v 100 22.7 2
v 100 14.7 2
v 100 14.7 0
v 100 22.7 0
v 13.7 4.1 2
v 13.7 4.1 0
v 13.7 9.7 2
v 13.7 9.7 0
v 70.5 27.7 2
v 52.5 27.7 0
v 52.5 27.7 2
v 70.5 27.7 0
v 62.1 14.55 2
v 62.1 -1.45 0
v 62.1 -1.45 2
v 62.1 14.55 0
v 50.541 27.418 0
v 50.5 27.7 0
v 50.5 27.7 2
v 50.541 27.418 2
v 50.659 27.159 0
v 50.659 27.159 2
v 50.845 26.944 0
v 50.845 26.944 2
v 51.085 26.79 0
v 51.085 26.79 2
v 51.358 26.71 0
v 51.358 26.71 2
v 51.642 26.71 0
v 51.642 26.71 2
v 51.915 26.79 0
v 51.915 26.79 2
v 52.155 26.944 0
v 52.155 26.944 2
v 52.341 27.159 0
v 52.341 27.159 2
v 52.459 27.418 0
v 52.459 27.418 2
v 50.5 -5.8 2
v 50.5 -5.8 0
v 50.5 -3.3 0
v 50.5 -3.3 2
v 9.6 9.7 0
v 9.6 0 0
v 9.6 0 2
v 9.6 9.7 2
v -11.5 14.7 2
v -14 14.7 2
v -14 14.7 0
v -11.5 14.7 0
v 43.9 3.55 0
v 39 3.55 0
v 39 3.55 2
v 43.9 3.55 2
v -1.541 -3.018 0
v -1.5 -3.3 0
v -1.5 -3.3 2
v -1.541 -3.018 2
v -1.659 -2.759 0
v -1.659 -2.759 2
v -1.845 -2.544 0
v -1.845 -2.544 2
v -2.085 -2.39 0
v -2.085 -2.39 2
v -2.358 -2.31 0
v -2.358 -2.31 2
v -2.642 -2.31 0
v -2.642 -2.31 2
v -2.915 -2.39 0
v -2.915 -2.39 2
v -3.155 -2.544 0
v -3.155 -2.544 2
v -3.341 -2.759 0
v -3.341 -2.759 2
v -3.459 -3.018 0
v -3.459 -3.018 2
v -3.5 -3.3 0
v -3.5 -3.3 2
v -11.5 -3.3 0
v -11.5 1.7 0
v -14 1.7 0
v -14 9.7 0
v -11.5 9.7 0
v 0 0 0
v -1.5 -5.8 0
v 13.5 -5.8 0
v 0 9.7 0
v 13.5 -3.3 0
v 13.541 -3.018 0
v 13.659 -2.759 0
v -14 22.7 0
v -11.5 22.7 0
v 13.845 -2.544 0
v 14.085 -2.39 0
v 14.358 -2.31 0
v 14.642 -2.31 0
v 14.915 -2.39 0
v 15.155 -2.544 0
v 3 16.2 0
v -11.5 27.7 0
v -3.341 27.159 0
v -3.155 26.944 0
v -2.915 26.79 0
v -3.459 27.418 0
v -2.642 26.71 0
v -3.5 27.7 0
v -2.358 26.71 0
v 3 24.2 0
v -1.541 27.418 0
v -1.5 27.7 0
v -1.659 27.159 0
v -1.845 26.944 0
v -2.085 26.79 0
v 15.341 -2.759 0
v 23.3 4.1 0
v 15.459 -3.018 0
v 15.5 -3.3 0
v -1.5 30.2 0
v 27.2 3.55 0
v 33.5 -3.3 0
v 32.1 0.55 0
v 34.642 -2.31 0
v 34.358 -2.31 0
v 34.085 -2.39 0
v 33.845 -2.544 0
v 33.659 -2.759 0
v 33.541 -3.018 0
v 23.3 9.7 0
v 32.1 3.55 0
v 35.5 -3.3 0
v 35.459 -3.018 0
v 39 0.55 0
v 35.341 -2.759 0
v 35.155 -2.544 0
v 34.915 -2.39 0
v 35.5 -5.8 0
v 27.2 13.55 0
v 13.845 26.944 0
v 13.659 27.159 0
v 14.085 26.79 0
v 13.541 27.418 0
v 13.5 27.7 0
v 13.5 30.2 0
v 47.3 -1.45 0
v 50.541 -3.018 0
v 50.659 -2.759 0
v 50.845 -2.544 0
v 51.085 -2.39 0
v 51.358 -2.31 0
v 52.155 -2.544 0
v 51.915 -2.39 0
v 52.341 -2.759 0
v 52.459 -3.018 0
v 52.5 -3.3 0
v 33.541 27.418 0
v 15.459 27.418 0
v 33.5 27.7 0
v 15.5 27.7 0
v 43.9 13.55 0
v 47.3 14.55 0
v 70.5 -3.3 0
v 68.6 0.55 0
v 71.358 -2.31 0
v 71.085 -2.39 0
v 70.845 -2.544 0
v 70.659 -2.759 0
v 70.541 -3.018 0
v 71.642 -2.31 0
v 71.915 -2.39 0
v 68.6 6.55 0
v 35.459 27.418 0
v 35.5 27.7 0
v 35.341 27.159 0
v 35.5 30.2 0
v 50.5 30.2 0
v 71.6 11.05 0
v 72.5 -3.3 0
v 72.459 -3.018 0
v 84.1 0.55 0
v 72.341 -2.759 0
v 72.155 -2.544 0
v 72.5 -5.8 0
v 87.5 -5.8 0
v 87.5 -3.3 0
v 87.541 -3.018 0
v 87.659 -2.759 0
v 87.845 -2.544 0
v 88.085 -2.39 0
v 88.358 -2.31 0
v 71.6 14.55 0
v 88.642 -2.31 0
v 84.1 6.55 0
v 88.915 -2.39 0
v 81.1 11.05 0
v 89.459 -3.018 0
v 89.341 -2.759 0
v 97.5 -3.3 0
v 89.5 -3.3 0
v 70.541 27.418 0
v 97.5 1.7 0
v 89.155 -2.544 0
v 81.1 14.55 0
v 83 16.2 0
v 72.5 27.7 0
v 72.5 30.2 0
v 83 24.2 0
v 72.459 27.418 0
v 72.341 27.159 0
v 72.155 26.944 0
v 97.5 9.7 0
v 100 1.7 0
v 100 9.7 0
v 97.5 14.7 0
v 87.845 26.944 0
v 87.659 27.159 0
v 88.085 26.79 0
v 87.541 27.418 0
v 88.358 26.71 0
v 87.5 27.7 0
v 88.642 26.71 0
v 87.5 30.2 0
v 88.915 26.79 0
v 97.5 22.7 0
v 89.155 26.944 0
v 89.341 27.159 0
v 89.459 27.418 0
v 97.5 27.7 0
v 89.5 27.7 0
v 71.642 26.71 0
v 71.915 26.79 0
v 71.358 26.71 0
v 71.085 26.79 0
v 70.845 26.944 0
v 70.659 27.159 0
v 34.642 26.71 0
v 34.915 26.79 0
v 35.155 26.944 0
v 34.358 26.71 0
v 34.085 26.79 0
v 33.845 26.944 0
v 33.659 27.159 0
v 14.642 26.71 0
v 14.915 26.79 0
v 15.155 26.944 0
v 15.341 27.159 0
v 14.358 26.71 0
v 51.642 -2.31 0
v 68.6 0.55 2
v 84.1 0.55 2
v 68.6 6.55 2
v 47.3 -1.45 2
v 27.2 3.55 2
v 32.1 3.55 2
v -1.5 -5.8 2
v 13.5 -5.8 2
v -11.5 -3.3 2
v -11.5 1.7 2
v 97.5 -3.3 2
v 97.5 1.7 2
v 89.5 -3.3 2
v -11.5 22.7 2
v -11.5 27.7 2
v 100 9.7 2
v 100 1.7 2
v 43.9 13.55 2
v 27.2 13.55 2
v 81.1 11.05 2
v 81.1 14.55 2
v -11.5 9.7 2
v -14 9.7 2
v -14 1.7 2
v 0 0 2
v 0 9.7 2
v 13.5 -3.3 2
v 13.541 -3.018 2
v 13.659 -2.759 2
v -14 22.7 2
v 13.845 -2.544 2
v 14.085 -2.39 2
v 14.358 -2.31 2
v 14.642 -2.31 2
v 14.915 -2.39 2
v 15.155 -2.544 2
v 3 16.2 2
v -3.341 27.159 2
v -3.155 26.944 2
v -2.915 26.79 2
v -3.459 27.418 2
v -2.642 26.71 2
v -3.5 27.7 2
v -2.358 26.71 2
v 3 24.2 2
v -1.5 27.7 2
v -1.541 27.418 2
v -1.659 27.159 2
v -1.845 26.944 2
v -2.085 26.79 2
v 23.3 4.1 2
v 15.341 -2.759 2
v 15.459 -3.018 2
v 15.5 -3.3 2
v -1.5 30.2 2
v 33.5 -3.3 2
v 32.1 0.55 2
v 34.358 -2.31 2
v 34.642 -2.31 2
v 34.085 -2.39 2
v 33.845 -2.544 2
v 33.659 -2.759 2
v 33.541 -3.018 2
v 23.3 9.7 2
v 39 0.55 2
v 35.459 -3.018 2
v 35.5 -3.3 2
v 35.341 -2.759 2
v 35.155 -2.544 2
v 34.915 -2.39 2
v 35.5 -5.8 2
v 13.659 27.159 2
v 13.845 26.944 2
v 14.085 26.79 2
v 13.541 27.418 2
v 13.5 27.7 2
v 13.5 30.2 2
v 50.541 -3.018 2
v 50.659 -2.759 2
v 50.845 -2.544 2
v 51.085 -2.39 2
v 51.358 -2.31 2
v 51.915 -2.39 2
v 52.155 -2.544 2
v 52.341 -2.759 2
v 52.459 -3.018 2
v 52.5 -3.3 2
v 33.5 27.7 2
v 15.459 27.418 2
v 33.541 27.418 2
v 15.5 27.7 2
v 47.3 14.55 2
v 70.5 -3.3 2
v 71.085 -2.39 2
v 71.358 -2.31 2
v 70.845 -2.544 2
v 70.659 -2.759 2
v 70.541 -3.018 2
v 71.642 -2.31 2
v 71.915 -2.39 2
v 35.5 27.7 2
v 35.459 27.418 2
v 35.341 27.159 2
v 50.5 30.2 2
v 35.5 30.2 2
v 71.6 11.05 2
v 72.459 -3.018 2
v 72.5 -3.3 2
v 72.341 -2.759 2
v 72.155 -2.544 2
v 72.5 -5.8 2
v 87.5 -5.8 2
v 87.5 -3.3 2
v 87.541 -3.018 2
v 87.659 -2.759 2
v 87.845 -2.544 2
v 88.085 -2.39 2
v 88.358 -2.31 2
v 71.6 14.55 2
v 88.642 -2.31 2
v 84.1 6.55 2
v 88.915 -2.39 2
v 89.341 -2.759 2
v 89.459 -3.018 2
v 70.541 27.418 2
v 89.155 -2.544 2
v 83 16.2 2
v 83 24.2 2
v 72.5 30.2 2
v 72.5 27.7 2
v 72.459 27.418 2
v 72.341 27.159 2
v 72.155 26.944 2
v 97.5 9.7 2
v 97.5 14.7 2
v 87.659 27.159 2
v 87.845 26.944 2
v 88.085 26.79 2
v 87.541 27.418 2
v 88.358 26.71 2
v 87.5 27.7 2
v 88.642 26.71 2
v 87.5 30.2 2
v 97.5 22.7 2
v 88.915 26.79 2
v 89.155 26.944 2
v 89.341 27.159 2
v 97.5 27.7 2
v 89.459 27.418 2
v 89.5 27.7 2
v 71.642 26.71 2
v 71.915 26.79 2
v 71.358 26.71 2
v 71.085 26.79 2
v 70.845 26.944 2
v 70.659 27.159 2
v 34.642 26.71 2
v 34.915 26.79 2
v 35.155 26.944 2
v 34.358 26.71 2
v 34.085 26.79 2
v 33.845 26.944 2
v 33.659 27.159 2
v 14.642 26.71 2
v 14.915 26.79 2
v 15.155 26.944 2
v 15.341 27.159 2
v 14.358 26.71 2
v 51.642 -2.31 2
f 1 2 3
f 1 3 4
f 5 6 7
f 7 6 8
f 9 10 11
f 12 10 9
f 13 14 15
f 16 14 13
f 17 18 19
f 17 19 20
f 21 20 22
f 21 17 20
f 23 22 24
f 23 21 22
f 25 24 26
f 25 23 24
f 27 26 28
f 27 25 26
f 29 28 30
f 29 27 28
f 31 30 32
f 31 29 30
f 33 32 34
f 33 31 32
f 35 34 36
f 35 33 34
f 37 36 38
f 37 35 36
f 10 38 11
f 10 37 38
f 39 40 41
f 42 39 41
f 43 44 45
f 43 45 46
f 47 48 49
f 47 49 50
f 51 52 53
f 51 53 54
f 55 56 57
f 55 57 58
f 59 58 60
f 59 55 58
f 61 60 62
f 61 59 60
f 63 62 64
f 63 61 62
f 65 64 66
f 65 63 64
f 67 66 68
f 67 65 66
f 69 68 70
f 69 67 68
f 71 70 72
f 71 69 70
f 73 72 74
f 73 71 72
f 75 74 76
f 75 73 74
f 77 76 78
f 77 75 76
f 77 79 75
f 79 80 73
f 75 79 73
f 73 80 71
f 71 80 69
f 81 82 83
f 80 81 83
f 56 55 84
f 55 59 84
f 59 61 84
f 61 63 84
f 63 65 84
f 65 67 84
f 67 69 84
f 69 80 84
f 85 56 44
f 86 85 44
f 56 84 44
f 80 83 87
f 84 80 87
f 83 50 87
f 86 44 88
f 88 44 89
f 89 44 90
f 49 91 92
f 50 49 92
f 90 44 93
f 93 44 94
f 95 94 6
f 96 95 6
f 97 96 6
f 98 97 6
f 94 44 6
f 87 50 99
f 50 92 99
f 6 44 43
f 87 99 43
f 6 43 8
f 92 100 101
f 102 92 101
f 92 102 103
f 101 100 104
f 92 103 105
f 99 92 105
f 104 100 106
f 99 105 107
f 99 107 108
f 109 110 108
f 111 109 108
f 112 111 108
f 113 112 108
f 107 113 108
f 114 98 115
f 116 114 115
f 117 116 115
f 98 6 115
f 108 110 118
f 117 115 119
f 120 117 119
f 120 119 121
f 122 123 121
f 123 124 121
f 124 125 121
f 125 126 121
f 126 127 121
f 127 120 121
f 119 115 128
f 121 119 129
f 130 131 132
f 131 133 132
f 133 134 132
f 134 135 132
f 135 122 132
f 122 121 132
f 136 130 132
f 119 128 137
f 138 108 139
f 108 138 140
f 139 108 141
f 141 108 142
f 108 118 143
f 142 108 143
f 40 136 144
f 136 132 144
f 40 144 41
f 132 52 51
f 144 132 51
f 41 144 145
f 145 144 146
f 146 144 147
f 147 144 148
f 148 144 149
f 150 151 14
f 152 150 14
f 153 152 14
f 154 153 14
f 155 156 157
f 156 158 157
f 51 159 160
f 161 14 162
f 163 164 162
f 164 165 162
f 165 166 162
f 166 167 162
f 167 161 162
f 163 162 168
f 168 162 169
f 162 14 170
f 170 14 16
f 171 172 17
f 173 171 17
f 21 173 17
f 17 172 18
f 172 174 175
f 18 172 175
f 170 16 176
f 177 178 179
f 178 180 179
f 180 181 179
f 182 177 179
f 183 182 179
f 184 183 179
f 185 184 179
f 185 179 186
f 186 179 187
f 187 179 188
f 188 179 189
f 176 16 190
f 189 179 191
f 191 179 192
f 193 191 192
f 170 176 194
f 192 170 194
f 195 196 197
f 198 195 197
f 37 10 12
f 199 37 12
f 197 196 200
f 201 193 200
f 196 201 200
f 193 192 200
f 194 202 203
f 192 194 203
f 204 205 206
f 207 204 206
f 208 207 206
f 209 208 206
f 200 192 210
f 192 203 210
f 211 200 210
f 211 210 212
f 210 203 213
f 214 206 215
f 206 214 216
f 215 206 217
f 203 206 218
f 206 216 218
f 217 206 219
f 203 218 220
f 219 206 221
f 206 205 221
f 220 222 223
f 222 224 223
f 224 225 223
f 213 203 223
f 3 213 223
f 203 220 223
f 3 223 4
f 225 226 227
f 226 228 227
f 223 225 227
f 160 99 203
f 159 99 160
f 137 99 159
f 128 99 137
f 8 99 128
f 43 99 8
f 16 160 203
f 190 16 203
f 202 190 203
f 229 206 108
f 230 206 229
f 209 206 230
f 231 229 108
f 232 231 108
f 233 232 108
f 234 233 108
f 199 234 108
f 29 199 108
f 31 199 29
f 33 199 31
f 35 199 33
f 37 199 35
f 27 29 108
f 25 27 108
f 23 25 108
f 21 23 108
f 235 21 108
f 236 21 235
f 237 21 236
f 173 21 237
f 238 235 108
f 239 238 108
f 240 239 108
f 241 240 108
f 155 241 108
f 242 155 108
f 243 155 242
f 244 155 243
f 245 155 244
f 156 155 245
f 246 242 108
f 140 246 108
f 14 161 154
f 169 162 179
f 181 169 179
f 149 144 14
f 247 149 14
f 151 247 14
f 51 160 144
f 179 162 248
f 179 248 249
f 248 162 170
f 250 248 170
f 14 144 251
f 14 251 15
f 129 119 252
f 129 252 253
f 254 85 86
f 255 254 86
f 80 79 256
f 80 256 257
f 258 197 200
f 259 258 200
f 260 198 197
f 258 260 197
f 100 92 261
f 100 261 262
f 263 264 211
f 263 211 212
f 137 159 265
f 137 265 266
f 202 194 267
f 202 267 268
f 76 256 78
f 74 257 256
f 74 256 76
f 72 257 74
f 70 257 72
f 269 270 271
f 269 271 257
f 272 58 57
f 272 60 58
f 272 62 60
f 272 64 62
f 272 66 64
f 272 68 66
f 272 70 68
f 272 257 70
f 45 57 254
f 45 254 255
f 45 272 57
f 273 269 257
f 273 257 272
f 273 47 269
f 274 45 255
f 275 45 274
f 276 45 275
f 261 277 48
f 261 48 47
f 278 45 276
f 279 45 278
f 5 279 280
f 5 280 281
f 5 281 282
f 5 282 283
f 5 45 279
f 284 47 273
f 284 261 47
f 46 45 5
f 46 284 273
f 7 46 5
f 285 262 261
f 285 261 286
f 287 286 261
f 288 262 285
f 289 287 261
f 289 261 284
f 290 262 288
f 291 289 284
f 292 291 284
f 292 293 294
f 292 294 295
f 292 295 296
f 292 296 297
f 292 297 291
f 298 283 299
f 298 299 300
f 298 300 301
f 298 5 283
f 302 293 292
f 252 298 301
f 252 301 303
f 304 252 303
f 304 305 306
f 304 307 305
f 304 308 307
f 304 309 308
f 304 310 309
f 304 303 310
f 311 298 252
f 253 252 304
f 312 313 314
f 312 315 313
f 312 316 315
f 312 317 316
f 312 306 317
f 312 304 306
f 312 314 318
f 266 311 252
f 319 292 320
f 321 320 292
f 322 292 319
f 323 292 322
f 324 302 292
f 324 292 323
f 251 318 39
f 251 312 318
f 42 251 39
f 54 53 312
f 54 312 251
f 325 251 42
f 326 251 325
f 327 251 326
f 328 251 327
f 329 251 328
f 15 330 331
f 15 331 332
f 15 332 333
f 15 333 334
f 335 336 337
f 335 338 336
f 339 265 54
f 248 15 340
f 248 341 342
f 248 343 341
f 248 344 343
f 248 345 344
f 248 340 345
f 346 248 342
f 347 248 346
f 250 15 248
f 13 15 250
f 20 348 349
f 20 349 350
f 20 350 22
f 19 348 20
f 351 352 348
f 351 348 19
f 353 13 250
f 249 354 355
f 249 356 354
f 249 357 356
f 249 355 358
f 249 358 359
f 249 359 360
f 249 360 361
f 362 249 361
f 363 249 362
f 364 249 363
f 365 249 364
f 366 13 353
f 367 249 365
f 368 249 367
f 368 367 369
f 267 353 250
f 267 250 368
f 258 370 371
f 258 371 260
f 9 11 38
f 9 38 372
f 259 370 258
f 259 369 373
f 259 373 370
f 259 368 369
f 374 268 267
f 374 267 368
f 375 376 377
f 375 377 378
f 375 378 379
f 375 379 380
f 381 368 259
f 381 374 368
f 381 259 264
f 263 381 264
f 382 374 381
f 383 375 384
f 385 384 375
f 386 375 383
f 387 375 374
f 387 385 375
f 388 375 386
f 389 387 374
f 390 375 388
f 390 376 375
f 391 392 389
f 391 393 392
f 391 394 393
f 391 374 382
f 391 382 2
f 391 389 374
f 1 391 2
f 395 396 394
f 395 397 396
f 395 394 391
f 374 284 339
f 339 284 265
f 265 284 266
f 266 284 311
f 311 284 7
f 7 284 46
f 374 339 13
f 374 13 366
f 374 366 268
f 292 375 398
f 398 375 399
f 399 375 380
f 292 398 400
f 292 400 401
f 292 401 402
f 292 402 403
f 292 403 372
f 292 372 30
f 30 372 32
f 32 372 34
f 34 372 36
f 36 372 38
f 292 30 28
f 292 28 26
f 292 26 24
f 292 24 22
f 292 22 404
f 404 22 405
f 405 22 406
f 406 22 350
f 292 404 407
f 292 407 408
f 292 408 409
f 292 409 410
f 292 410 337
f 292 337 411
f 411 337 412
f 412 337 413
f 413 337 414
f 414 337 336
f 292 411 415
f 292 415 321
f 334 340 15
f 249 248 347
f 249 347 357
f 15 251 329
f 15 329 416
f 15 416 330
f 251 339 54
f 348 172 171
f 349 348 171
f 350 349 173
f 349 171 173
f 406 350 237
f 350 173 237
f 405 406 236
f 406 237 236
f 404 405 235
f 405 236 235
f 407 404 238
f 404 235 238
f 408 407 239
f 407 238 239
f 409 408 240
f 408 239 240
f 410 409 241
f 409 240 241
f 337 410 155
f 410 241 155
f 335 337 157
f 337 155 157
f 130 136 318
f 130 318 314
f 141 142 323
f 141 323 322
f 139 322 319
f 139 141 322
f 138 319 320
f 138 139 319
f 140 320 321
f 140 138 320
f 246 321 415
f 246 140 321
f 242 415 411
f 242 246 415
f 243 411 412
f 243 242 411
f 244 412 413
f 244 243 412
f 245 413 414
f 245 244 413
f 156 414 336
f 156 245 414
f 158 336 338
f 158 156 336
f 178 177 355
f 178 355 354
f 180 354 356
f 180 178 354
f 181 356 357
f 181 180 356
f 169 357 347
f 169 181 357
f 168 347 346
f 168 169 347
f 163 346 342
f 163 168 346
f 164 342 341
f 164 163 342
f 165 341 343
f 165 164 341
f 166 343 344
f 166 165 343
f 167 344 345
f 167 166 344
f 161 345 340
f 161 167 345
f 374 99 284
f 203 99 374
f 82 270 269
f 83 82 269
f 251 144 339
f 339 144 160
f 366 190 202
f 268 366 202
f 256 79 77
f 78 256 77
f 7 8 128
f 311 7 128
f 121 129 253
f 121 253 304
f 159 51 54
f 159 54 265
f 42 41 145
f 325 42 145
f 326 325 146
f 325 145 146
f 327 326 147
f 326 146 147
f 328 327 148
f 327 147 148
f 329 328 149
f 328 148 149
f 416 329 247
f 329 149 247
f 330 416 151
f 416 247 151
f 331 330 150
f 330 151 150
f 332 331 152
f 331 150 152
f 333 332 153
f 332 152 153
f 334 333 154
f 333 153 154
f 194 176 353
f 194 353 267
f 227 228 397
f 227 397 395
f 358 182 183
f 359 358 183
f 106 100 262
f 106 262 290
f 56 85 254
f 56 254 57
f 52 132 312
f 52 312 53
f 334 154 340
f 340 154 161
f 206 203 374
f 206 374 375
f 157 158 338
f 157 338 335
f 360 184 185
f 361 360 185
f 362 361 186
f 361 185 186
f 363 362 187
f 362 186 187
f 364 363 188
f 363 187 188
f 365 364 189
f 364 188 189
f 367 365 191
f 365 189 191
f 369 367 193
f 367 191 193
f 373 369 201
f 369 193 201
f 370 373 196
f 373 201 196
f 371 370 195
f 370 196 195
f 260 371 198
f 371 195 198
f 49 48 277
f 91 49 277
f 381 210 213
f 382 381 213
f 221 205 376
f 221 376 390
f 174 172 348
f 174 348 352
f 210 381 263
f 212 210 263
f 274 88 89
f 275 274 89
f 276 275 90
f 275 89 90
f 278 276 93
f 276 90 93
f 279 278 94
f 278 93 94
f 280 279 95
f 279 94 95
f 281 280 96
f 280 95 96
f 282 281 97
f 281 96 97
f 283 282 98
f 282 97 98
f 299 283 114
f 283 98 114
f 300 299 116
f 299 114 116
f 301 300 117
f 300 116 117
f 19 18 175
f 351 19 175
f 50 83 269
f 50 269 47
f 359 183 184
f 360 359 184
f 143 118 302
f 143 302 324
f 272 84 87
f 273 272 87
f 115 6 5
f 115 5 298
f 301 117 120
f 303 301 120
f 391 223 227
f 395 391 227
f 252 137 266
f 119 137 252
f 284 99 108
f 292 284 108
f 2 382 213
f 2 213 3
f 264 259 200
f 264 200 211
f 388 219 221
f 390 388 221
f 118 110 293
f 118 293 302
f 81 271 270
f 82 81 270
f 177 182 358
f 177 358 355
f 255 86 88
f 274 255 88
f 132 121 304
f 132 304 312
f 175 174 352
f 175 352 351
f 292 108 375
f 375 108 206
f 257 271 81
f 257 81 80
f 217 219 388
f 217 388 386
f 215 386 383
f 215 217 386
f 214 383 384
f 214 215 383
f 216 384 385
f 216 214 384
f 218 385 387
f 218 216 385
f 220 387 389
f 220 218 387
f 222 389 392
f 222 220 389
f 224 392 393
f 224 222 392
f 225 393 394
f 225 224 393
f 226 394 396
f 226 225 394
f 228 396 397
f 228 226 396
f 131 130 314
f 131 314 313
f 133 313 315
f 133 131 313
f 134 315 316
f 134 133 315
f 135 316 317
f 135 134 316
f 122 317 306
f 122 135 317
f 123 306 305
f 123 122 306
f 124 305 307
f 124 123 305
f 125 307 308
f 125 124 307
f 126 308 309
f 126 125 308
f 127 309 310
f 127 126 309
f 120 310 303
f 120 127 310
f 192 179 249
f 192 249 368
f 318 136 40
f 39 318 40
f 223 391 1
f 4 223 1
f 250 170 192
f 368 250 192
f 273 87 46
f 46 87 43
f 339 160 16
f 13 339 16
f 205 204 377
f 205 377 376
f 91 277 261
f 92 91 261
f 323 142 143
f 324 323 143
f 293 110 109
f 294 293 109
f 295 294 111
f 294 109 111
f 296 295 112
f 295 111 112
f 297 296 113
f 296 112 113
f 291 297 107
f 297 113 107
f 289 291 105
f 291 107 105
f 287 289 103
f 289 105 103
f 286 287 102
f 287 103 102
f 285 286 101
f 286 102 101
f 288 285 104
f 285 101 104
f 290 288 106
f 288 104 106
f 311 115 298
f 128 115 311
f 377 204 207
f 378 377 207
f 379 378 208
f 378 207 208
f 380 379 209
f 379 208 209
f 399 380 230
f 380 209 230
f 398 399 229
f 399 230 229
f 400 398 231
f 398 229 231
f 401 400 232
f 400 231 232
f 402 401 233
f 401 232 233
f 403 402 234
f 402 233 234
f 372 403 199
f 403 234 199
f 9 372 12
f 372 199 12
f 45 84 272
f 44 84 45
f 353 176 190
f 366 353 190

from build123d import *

# Parameters (mm, degrees)
SKETCH_1_W          = 109
SKETCH_1_H          = 31
SKETCH_1_W_2        = 9.6
SKETCH_1_H_2        = 9.7
SKETCH_1_H_3        = 5.6
SKETCH_1_W_3        = 14.8
SKETCH_1_H_4        = 16
SKETCH_1_W_4        = 9.5
SKETCH_1_H_5        = 3.5
SKETCH_1_W_5        = 15.5
SKETCH_1_H_6        = 6
SKETCH_1_W_6        = 80
SKETCH_1_H_7        = 8
EXTRUDE_1_DEPTH     = 2
SKETCH_2_W          = 2.5
SKETCH_2_H          = 8
EXTRUDE_2_DEPTH     = 2
SKETCH_3_W          = 15
SKETCH_3_H          = 2.5
EXTRUDE_4_DEPTH     = 2
CUT_EXTRUDE_2_DEPTH = 2


with BuildPart() as part:
    # 草图1 → 凸台-拉伸1 (new body)
    with BuildSketch(Plane.XY):
        with Locations((43, 12.2)):
            Rectangle(SKETCH_1_W, SKETCH_1_H)
        Polygon((27.2, 3.55), (32.1, 3.55), (32.1, 0.55), (39, 0.55), (39, 3.55), (43.9, 3.55), (43.9, 13.55), (27.2, 13.55), align=None, mode=Mode.SUBTRACT)
        with Locations((4.8, 4.85)):
            Rectangle(SKETCH_1_W_2, SKETCH_1_H_2, mode=Mode.SUBTRACT)
        with Locations((18.5, 6.9)):
            Rectangle(SKETCH_1_W_2, SKETCH_1_H_3, mode=Mode.SUBTRACT)
        with Locations((54.7, 6.55)):
            Rectangle(SKETCH_1_W_3, SKETCH_1_H_4, mode=Mode.SUBTRACT)
        with Locations((76.35, 12.8)):
            Rectangle(SKETCH_1_W_4, SKETCH_1_H_5, mode=Mode.SUBTRACT)
        with Locations((76.35, 3.55)):
            Rectangle(SKETCH_1_W_5, SKETCH_1_H_6, mode=Mode.SUBTRACT)
        with Locations((43, 20.2)):
            Rectangle(SKETCH_1_W_6, SKETCH_1_H_7, mode=Mode.SUBTRACT)
    extrude(amount=EXTRUDE_1_DEPTH)

    # 草图2 → 凸台-拉伸2 (add)
    with BuildSketch(Plane.XY.offset(2)):
        with Locations((-12.75, 18.7)):
            Rectangle(SKETCH_2_W, SKETCH_2_H)
        with Locations((-12.75, 5.7)):
            Rectangle(SKETCH_2_W, SKETCH_2_H)
        with Locations((98.75, 5.7)):
            Rectangle(SKETCH_2_W, SKETCH_2_H)
        with Locations((98.75, 18.7)):
            Rectangle(SKETCH_2_W, SKETCH_2_H)
    extrude(amount=-EXTRUDE_2_DEPTH)

    # 草图3 → 凸台-拉伸4 (add)
    with BuildSketch(Plane.XY):
        with Locations((6, 28.95)):
            Rectangle(SKETCH_3_W, SKETCH_3_H)
        with Locations((43, 28.95)):
            Rectangle(SKETCH_3_W, SKETCH_3_H)
        with Locations((80, 28.95)):
            Rectangle(SKETCH_3_W, SKETCH_3_H)
        with Locations((80, -4.55)):
            Rectangle(SKETCH_3_W, SKETCH_3_H)
        with Locations((43, -4.55)):
            Rectangle(SKETCH_3_W, SKETCH_3_H)
        with Locations((6, -4.55)):
            Rectangle(SKETCH_3_W, SKETCH_3_H)
    extrude(amount=EXTRUDE_4_DEPTH)

    # 草图4 → 切除-拉伸2 (cut)
    with BuildSketch(Plane.XY):
        with BuildLine():
            Line((-3.5, 27.7), (-1.5, 27.7))
            ThreePointArc((-1.5, 27.7), (-2.5, 26.7), (-3.5, 27.7))
        make_face()
        with BuildLine():
            Line((15.5, 27.7), (13.5, 27.7))
            ThreePointArc((13.5, 27.7), (14.5, 26.7), (15.5, 27.7))
        make_face()
        with BuildLine():
            Line((33.5, 27.7), (35.5, 27.7))
            ThreePointArc((35.5, 27.7), (34.5, 26.7), (33.5, 27.7))
        make_face()
        with BuildLine():
            Line((52.5, 27.7), (50.5, 27.7))
            ThreePointArc((50.5, 27.7), (51.5, 26.7), (52.5, 27.7))
        make_face()
        with BuildLine():
            Line((70.5, 27.7), (72.5, 27.7))
            ThreePointArc((72.5, 27.7), (71.5, 26.7), (70.5, 27.7))
        make_face()
        with BuildLine():
            Line((89.5, 27.7), (87.5, 27.7))
            ThreePointArc((87.5, 27.7), (88.5, 26.7), (89.5, 27.7))
        make_face()
        with BuildLine():
            Line((89.5, -3.3), (87.5, -3.3))
            ThreePointArc((87.5, -3.3), (88.5, -2.3), (89.5, -3.3))
        make_face()
        with BuildLine():
            Line((70.5, -3.3), (72.5, -3.3))
            ThreePointArc((72.5, -3.3), (71.5, -2.3), (70.5, -3.3))
        make_face()
        with BuildLine():
            Line((52.5, -3.3), (50.5, -3.3))
            ThreePointArc((50.5, -3.3), (51.5, -2.3), (52.5, -3.3))
        make_face()
        with BuildLine():
            Line((33.5, -3.3), (35.5, -3.3))
            ThreePointArc((35.5, -3.3), (34.5, -2.3), (33.5, -3.3))
        make_face()
        with BuildLine():
            Line((15.5, -3.3), (13.5, -3.3))
            ThreePointArc((13.5, -3.3), (14.5, -2.3), (15.5, -3.3))
        make_face()
        with BuildLine():
            Line((-3.5, -3.3), (-1.5, -3.3))
            ThreePointArc((-1.5, -3.3), (-2.5, -2.3), (-3.5, -3.3))
        make_face()
    extrude(amount=CUT_EXTRUDE_2_DEPTH, mode=Mode.SUBTRACT)


solid = part.part
